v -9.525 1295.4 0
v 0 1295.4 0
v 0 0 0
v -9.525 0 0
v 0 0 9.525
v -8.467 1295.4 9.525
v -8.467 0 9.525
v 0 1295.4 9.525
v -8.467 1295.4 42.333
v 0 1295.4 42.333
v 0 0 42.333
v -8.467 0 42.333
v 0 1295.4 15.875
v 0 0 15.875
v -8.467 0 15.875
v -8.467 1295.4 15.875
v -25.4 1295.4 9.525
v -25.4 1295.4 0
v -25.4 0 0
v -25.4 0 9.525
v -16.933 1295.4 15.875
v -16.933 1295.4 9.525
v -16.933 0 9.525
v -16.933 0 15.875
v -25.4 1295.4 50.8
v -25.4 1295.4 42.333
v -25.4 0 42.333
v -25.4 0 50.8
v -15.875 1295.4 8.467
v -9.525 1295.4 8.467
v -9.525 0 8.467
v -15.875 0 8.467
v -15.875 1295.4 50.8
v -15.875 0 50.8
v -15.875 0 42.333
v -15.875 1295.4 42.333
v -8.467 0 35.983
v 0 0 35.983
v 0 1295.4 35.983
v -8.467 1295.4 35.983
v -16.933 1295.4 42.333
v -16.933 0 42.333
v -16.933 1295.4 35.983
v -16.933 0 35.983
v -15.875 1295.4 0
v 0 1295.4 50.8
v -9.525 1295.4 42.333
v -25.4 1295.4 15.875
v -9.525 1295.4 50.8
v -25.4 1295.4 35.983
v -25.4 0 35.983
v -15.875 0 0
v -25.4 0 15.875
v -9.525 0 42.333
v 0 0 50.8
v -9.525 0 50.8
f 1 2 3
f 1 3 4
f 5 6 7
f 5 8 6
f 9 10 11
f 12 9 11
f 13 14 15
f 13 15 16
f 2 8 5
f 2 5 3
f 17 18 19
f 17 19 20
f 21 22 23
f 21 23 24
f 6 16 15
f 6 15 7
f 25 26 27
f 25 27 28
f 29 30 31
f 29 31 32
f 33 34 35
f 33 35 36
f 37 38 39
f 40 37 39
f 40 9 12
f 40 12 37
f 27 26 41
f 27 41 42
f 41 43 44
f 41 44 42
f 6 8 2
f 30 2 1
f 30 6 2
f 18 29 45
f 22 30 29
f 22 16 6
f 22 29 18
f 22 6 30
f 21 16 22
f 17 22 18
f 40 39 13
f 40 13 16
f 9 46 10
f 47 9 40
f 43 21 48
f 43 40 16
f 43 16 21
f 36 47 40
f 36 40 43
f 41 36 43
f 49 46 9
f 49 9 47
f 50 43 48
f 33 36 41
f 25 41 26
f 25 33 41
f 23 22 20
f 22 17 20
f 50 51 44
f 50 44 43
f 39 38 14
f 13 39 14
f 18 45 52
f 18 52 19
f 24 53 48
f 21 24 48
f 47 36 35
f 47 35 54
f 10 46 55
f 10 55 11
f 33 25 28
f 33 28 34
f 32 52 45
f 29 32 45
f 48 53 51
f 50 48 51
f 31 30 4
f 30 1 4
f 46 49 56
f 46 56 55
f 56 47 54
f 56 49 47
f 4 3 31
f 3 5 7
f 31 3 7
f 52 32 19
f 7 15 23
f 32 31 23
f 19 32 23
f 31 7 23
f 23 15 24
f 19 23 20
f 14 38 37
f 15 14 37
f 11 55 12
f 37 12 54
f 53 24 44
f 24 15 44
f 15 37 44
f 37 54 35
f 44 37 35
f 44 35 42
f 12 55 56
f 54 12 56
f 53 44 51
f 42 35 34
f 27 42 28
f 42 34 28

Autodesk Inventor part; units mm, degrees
ref_plane "YZ Plane" through (0, 0, 0) normal (1, 0, 0) x (0, 1, 0)
ref_plane "XZ Plane" through (0, 0, 0) normal (0, 1, 0) x (-1, 0, 0)
ref_plane "XY Plane" through (0, 0, 0) normal (0, 0, 1) x (1, 0, 0)
sketch "Sketch1" plane through (0, 0, 0) normal (0, 1, 0) x (-1, 0, 0)
  line L0 (0, 0) -> (25.4, 0)
  line L1 (25.4, 0) -> (25.4, 50.8)
  line L2 (25.4, 50.8) -> (0, 50.8)
  line L3 (0, 50.8) -> (0, 0)
  dimension "d0" = 50.8
  dimension "d1" = 25.4
extrude "Extrusion1" add sketch "Sketch1" along normal blind 1295.4
sketch "Sketch2" plane through (0, 0, 50.8) normal (0, 0, 1) x (1, 0, 0)
  line L0 (-9.525, 0) -> (-15.875, 0)
  line L1 (-15.875, 0) -> (-15.875, 1295.4)
  line L2 (-25.4, 0) -> (-25.4, 1295.4) projected
  line L3 (0, 1295.4) -> (-25.4, 1295.4) projected
  line L4 (-9.525, 1295.4) -> (-9.525, 0)
  line L5 (0, 0) -> (0, 1295.4) projected
  line L6 (0, 0) -> (-25.4, 0) projected
  line L7 (-15.875, 1295.4) -> (-9.525, 1295.4)
  dimension "d4" = 9.525
  dimension "d5" = 6.35
  dimension "d6" = 9.525
  dimension "d9" = 9.525
extrude "Extrusion2" cut sketch "Sketch2" against normal blind 8.4667 contours L0 L1 L3 L4
sketch "Sketch3" plane through (-25.4, 0, 0) normal (0, 0, -1) x (-1, 0, 0)
  line L0 (-15.875, 0) -> (-9.525, 0)
  line L1 (-9.525, 0) -> (-9.525, 1295.4)
  line L2 (-9.525, 1295.4) -> (-15.875, 1295.4)
  line L3 (-15.875, 1295.4) -> (-15.875, 0)
  point P0 (-25.4, 0)
extrude "Extrusion3" cut sketch "Sketch3" against normal blind 8.4667
sketch "Sketch4" plane through (-25.4, 0, 0) normal (-1, 0, 0) x (0, 0, 1)
  line L0 (0, 1295.4) -> (50.8, 1295.4) projected
  line L1 (9.525, 0) -> (15.875, 0)
  line L2 (15.875, 0) -> (15.875, 1295.4)
  line L3 (15.875, 1295.4) -> (9.525, 1295.4)
  line L4 (9.525, 1295.4) -> (9.525, 0)
  line L5 (35.9833, 1295.4) -> (42.3333, 1295.4)
  line L6 (42.3333, 1295.4) -> (42.3333, 0)
  line L7 (42.3333, 0) -> (35.9833, 0)
  line L8 (35.9833, 0) -> (35.9833, 1295.4)
  line L9 (0, 0) -> (0, 1295.4) projected
  point P0 (50.8, 0)
  dimension "d14" = 9.525
  dimension "d16" = 6.35
  dimension "d17" = 6.35
  dimension "d18" = 9.525
extrude "Extrusion4" cut sketch "Sketch4" against normal blind 8.4667
sketch "Sketch5" plane through (0, 0, 50.8) normal (1, 0, 0) x (0, 0, -1)
  line L0 (8.4667, 0) -> (14.8167, 0)
  line L1 (14.8167, 0) -> (14.8167, 1295.4)
  line L2 (14.8167, 1295.4) -> (8.4667, 1295.4)
  line L3 (8.4667, 1295.4) -> (8.4667, 0)
  line L4 (34.925, 1295.4) -> (41.275, 1295.4)
  line L5 (41.275, 1295.4) -> (41.275, 0)
  line L6 (41.275, 0) -> (34.925, 0)
  line L7 (34.925, 0) -> (34.925, 1295.4)
  point P0 (50.8, 0)
extrude "Extrusion5" cut sketch "Sketch5" against normal blind 8.4667
properties part number "HammerStick Stick"
